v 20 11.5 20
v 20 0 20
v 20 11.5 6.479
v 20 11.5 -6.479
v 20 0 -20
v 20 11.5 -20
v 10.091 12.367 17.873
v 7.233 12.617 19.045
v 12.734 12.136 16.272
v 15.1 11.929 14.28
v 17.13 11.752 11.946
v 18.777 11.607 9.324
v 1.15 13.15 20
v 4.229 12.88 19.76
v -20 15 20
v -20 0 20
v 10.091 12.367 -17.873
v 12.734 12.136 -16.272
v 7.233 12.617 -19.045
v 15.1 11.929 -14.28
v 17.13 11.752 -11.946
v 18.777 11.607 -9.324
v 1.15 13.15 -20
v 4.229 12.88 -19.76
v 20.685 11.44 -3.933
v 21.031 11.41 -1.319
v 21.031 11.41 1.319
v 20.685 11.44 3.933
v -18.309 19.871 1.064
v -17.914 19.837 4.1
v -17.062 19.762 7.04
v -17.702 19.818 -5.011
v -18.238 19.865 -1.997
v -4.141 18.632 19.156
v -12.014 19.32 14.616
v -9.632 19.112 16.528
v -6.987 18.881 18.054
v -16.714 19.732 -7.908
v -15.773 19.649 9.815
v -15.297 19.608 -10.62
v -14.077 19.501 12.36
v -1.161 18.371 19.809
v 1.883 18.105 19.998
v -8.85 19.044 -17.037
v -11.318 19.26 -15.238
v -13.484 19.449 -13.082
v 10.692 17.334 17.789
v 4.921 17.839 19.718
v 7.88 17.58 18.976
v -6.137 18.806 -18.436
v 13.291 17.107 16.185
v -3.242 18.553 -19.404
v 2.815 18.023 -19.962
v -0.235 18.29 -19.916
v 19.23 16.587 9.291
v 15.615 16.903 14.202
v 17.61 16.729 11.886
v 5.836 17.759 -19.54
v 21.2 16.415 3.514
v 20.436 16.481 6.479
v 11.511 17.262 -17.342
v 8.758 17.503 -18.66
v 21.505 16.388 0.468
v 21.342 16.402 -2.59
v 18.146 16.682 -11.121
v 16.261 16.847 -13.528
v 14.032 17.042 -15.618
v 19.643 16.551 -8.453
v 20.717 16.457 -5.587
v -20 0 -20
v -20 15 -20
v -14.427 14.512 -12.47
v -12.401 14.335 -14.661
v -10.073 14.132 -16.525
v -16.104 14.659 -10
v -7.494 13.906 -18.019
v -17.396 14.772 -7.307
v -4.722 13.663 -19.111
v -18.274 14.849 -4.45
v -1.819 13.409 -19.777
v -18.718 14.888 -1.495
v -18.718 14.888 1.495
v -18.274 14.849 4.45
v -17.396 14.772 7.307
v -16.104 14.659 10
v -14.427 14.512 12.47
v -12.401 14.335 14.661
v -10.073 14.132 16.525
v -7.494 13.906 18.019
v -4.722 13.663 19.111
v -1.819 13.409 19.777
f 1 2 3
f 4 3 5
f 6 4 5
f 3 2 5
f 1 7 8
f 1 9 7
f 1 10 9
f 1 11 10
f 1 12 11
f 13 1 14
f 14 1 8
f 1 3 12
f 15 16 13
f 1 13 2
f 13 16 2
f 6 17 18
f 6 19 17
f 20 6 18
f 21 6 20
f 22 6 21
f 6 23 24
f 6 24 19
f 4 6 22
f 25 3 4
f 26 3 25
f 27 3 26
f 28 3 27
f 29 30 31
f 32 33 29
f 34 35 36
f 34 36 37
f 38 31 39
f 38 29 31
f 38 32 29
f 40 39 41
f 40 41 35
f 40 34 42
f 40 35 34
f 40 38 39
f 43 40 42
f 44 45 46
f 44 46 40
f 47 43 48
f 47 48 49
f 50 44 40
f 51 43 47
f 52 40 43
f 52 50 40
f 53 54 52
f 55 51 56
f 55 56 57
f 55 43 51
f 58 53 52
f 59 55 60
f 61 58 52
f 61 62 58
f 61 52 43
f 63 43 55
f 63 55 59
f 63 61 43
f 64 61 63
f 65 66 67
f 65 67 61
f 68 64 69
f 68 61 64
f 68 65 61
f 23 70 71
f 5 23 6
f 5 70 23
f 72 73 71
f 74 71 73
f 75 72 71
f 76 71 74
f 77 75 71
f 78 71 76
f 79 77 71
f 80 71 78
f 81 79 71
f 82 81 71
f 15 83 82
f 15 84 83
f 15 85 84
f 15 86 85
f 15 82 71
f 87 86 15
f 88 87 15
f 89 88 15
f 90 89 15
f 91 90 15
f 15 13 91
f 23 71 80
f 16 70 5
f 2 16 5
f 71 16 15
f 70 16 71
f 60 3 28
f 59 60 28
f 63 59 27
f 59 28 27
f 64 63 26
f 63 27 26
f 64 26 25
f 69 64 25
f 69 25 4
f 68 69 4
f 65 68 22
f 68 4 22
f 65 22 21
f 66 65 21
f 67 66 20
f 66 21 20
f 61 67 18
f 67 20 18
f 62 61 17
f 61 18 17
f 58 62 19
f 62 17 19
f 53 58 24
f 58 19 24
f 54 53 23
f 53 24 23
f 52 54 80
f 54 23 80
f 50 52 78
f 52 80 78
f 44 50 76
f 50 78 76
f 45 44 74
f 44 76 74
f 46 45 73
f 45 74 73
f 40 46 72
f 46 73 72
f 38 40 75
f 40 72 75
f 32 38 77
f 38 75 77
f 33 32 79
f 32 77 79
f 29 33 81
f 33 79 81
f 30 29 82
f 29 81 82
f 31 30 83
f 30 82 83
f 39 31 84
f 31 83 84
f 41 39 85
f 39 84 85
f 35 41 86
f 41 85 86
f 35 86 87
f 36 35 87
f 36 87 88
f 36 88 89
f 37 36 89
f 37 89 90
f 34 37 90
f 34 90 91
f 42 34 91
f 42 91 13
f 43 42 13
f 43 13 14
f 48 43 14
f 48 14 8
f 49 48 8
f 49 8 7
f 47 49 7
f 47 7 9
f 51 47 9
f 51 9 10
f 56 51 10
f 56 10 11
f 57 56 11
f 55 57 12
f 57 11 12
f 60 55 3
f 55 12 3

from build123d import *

# Parameters (mm, degrees)
SKETCH3_W           = 40
SKETCH3_H           = 40
BOSS_EXTRUDE3_DEPTH = 15
SKETCH5_W           = 53.617813986
SKETCH5_H           = 48.453012442
CUT_EXTRUDE1_DEPTH  = 6
SKETCH6_R           = 20
BOSS_EXTRUDE4_DEPTH = 5


with BuildPart() as part:
    # Sketch3 → Boss-Extrude3 (new body)
    with BuildSketch(Plane(origin=(0, 0, 0), x_dir=(1, 0, 0), z_dir=(0, 1, 0))):
        Rectangle(SKETCH3_W, SKETCH3_H)
    extrude(amount=BOSS_EXTRUDE3_DEPTH)

    # Sketch5 → Cut-Extrude1 (cut)
    with BuildSketch(Plane(origin=(1.150438863, 13.149576371, 0), x_dir=(0, 0, 1), z_dir=(0.08715574274765836, 0.9961946980917455, 0))):
        Rectangle(SKETCH5_W, SKETCH5_H)
    extrude(amount=CUT_EXTRUDE1_DEPTH, mode=Mode.SUBTRACT)

    # Sketch6 → Boss-Extrude4 (add)
    with BuildSketch(Plane(origin=(1.150438863, 13.149576371, 0), x_dir=(0.9961946980917455, -0.08715574274765835, 0), z_dir=(0.08715574274765836, 0.9961946980917457, 0))):
        with Locations(Location((0, 0, 0), (0, 0, 341.098728442))):
            Circle(SKETCH6_R)
    extrude(amount=BOSS_EXTRUDE4_DEPTH)


solid = part.part
